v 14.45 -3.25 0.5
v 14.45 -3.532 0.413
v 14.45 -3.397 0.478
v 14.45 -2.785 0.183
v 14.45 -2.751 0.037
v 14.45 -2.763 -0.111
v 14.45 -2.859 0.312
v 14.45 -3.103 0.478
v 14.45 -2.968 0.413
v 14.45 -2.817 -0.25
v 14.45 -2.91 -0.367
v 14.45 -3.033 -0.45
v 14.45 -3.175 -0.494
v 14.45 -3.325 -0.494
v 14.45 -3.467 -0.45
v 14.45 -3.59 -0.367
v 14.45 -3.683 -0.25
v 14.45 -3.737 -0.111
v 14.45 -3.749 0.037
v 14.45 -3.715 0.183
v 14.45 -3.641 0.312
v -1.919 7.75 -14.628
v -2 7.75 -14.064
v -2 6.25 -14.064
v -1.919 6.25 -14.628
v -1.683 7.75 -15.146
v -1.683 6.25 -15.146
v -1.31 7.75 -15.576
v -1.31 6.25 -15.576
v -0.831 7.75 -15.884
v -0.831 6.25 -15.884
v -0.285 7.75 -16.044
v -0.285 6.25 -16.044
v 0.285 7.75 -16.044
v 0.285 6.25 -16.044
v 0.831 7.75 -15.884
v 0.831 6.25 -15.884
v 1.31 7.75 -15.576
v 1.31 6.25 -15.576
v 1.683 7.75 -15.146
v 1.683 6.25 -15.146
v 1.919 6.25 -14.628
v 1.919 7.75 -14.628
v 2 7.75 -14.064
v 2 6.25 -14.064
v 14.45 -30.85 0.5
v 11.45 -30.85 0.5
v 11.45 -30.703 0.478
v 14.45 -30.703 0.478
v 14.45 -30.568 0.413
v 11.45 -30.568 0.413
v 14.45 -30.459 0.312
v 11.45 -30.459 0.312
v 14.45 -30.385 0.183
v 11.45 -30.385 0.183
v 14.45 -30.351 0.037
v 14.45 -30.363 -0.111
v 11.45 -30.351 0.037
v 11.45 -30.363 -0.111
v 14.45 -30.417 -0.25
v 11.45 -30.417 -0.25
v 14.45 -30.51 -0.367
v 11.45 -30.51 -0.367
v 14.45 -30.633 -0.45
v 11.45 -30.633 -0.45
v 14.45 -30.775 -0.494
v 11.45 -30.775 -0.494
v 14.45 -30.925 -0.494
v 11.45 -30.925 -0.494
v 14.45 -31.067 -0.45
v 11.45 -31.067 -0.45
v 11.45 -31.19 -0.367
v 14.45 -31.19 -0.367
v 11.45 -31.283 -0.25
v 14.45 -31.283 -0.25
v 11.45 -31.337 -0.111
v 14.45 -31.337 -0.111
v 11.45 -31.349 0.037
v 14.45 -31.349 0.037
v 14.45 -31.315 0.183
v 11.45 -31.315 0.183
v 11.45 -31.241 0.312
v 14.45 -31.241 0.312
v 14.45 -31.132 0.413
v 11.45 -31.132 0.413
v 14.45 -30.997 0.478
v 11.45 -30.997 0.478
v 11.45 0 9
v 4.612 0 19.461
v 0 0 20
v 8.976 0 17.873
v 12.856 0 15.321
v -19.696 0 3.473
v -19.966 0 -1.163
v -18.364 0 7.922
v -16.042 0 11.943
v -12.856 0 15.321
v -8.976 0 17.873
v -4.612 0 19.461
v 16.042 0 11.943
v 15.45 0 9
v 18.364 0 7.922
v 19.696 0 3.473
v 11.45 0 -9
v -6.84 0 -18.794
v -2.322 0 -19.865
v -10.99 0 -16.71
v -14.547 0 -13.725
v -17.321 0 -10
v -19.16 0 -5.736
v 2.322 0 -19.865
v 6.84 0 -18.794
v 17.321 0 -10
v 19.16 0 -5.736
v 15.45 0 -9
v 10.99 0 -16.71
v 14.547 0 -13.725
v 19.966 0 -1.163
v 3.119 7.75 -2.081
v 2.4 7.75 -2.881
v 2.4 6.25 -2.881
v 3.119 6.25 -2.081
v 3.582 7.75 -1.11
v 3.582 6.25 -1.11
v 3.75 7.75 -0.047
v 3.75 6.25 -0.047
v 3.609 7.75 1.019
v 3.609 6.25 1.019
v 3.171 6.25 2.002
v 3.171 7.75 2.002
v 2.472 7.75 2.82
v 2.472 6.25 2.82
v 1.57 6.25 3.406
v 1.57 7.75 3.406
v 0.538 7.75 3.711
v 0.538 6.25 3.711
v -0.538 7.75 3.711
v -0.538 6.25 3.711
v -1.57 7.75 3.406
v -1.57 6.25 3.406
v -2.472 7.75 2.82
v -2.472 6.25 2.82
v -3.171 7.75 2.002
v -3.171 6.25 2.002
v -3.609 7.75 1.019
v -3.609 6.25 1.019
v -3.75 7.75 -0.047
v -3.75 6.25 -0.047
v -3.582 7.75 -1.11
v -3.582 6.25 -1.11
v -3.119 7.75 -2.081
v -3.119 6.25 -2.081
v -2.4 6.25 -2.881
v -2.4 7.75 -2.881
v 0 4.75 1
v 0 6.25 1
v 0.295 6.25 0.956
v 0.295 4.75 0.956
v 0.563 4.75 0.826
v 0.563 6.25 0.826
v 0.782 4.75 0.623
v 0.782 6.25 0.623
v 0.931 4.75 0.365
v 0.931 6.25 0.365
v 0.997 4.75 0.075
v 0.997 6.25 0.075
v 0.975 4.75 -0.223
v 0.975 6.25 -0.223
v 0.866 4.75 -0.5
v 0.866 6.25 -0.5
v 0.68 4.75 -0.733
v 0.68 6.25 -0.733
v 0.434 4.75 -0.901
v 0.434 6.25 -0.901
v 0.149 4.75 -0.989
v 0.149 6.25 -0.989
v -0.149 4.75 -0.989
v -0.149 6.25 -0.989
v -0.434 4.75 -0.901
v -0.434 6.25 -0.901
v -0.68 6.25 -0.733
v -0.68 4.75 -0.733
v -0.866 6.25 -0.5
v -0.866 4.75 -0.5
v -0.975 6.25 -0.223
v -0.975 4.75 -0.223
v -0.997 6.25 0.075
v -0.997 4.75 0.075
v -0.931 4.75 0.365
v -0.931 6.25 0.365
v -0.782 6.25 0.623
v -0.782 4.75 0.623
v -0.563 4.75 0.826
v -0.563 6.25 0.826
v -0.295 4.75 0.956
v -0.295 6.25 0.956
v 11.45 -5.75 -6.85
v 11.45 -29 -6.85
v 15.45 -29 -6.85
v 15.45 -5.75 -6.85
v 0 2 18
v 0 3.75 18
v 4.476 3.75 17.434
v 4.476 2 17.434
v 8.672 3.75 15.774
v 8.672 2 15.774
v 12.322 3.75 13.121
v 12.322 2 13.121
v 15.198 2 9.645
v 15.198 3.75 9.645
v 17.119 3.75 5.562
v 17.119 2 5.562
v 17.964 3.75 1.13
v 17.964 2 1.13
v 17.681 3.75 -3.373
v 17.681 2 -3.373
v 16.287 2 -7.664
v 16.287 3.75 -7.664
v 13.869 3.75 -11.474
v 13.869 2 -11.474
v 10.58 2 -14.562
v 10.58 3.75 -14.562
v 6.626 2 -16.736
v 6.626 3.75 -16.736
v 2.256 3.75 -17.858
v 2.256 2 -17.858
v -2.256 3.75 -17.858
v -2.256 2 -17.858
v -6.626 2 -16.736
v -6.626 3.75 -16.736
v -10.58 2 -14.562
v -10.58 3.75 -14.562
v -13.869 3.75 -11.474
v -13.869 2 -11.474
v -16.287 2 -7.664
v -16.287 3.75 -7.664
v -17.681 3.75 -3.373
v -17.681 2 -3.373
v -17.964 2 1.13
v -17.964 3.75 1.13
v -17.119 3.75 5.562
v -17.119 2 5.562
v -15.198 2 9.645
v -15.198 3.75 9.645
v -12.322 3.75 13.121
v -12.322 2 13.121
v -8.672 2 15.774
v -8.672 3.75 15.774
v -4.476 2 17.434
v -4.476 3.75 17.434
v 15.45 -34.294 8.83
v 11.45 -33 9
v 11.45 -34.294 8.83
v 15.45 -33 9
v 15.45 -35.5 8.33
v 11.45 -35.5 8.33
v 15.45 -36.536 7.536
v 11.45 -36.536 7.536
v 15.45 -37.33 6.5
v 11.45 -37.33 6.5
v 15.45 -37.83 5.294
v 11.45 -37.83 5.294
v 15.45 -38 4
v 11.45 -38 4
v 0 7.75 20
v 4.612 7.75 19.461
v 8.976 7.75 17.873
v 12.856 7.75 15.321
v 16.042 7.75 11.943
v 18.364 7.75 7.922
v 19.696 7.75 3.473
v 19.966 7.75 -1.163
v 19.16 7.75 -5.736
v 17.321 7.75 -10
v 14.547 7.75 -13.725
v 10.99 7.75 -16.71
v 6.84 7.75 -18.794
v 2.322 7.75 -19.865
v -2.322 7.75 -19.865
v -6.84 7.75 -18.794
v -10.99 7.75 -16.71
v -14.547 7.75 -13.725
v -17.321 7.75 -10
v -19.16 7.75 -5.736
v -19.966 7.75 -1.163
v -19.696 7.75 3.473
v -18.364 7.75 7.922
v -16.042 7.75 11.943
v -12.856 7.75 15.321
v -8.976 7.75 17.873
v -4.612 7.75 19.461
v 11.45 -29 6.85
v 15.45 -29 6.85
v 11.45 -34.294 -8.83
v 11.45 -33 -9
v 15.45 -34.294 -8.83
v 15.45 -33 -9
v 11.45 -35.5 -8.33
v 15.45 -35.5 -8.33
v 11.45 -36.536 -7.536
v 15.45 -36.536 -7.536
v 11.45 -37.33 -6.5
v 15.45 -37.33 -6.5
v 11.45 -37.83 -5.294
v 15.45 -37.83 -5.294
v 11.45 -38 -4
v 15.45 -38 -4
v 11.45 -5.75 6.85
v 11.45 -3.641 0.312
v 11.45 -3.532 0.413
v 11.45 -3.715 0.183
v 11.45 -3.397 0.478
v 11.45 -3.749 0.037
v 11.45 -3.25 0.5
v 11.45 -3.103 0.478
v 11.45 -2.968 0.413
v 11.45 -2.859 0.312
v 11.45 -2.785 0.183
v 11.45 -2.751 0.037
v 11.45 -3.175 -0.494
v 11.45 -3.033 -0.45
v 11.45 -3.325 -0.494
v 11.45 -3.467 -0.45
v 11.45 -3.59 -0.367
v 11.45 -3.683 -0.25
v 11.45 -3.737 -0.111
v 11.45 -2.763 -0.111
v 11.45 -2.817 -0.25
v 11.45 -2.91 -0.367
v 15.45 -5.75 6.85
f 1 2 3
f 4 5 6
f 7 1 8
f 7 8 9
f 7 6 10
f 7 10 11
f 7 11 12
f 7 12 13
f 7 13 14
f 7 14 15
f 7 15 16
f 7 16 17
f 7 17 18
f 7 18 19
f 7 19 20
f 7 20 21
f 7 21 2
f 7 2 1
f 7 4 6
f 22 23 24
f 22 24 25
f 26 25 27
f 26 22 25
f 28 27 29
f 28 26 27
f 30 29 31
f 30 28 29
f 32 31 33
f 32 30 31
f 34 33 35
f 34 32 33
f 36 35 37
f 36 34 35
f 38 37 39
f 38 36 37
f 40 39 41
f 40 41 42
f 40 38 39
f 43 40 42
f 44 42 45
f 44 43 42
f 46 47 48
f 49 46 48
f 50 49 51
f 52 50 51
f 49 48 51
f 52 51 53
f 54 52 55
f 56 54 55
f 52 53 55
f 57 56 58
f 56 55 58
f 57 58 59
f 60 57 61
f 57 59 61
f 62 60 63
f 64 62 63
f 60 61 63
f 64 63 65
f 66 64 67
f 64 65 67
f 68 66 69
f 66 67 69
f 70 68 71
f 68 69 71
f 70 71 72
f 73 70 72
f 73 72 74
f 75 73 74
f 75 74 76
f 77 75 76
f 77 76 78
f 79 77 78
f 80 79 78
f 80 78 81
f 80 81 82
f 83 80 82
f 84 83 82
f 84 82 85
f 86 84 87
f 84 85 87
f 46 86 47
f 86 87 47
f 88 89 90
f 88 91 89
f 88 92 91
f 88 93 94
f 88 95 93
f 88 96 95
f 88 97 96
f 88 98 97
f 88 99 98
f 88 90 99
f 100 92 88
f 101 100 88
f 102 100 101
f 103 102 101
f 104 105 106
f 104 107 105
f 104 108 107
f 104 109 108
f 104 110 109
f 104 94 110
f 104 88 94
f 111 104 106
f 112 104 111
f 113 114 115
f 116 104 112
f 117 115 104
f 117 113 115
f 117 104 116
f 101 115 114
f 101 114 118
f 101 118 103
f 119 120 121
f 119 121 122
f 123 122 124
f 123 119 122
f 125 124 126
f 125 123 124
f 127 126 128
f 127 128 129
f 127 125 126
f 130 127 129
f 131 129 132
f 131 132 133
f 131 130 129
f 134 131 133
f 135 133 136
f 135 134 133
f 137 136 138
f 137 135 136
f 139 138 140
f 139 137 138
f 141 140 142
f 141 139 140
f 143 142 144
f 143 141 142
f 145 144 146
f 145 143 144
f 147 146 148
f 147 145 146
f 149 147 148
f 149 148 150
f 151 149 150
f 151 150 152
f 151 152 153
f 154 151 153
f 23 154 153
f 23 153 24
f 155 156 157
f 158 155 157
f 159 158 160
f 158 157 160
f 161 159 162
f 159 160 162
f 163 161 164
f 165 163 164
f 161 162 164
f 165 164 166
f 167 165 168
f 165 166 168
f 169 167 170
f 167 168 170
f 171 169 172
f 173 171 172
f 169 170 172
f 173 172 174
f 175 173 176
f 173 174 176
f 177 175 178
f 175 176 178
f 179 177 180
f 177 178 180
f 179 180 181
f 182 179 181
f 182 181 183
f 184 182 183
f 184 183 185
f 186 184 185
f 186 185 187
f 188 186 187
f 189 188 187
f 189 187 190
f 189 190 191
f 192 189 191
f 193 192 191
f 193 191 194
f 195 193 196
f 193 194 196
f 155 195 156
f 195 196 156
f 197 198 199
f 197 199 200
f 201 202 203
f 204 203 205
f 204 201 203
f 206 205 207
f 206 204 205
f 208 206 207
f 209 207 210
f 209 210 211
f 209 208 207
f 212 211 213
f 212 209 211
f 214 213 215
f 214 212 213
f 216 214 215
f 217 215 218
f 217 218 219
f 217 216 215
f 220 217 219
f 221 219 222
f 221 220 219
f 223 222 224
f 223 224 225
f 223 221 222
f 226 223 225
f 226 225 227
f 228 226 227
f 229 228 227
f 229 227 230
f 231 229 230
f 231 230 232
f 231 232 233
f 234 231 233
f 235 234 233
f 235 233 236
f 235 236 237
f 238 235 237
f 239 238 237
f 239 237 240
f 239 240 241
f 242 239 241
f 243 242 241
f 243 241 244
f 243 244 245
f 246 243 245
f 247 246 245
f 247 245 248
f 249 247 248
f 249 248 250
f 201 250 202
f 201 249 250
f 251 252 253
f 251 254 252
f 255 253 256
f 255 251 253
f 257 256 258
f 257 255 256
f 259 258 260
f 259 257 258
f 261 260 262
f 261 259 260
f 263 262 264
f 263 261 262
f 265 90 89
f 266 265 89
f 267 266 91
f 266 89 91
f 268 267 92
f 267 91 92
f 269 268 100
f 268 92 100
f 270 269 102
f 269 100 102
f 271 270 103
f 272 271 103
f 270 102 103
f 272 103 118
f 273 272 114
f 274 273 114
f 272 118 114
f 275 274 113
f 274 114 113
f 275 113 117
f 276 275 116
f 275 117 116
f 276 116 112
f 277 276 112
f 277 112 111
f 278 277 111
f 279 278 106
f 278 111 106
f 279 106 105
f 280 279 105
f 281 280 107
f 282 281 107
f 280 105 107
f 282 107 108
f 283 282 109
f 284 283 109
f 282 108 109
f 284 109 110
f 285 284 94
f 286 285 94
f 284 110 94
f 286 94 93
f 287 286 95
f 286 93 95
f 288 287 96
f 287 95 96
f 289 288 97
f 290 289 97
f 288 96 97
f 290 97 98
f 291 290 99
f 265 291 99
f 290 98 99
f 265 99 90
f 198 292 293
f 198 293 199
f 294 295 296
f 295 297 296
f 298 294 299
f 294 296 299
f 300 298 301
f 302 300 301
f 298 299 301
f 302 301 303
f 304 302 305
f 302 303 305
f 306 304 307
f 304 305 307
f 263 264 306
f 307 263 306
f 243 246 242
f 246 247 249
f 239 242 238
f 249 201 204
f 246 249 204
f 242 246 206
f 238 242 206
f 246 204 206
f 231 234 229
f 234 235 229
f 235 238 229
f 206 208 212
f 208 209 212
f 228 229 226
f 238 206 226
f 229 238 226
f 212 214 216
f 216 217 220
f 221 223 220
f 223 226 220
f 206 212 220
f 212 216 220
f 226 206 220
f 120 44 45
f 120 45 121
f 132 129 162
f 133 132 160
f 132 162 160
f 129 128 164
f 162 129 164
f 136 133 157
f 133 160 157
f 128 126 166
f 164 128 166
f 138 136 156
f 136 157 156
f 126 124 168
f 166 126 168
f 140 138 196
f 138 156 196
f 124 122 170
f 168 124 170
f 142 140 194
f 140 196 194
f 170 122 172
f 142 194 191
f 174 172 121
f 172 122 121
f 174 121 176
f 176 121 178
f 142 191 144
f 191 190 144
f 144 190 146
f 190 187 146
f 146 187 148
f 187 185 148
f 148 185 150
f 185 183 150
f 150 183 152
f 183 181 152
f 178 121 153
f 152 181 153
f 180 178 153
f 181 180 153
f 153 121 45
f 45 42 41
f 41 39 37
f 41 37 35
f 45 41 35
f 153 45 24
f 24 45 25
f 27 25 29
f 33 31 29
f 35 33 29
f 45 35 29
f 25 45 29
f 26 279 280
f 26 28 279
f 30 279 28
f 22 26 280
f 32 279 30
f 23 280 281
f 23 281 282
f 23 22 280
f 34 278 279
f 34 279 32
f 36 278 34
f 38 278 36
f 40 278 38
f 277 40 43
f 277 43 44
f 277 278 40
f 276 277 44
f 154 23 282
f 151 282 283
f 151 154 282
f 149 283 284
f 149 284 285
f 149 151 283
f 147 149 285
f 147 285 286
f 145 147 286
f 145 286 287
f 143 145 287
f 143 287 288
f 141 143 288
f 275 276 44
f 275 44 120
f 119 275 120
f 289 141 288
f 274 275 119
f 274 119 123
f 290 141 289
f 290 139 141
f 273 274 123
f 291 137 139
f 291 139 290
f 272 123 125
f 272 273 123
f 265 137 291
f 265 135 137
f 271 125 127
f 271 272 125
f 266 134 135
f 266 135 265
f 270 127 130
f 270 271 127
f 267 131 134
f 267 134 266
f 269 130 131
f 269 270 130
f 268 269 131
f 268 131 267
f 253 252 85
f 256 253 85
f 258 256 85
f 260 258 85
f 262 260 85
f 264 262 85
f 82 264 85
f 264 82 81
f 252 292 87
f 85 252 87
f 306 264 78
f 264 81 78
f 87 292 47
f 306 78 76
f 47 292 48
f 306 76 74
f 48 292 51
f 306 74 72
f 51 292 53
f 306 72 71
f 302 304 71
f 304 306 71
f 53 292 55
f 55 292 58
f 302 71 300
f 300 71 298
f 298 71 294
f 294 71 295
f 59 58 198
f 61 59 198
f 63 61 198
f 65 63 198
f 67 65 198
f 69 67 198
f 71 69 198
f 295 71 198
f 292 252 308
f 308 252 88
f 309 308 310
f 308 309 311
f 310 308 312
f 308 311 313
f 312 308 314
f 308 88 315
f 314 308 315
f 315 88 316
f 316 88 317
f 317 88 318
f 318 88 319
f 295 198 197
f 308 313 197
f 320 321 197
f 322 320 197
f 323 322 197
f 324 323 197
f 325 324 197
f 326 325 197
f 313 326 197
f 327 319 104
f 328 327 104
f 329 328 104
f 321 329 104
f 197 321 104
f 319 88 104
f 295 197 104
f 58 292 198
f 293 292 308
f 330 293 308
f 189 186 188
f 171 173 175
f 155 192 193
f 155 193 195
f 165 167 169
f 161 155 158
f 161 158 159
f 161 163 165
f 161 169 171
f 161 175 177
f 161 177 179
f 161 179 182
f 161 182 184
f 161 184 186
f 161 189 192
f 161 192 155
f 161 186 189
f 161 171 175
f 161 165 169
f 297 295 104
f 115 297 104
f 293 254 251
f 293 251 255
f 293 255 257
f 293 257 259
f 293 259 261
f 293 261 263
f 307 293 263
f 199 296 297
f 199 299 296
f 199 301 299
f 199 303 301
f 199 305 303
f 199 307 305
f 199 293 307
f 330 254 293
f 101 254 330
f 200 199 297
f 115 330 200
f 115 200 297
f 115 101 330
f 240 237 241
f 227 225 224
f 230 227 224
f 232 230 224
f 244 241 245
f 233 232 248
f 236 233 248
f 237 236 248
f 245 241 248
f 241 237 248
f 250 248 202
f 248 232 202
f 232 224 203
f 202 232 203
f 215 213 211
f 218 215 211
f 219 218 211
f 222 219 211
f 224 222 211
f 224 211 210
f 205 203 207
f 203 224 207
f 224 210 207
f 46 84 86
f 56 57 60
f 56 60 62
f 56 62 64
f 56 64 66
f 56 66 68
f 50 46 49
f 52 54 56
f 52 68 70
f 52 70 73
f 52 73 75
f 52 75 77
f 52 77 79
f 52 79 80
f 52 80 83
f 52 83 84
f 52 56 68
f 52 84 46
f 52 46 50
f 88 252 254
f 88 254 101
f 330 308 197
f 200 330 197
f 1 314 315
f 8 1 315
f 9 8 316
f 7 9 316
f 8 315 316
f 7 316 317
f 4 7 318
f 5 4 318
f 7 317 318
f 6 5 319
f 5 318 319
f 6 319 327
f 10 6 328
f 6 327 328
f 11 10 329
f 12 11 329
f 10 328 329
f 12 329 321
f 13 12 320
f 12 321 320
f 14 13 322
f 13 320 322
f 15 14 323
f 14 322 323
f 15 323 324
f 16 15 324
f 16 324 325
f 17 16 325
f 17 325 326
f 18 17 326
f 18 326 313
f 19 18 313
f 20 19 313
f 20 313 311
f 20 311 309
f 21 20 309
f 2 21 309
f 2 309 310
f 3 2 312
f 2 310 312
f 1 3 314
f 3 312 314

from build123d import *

# Parameters (mm, degrees)
SKETCH1_R           = 20
SKETCH1_R_2         = 18
BOSS_EXTRUDE1_DEPTH = 7.75
BOSS_EXTRUDE2_START = -4
SKETCH2_R           = 18
BOSS_EXTRUDE2_DEPTH = 4
CUT_EXTRUDE1_DEPTH  = 1.5
SKETCH4_R           = 1
CUT_EXTRUDE2_DEPTH  = 1.5
SKETCH5_W           = 18
SKETCH5_H           = 38
SKETCH5_W_2         = 13.7
SKETCH5_H_2         = 23.25
BOSS_EXTRUDE3_DEPTH = 4
SKETCH6_R           = 18
BOSS_EXTRUDE4_DEPTH = 2
SKETCH7_R           = 0.5
CUT_EXTRUDE3_DEPTH  = 3
FILLET1_R           = 5


with BuildPart() as part:
    # Sketch1 → Boss-Extrude1 (new body)
    with BuildSketch(Plane(origin=(0, 0, 0), x_dir=(1, 0, 0), z_dir=(0, 1, 0))):
        with Locations(Location((0, 0, 0), (0, 0, 270))):
            Circle(SKETCH1_R)
        with Locations(Location((0, 0, 0), (0, 0, 270))):
            Circle(SKETCH1_R_2, mode=Mode.SUBTRACT)
    extrude(amount=BOSS_EXTRUDE1_DEPTH)

    # Sketch2 → Boss-Extrude2 (add)
    with BuildSketch(Plane(origin=(0, 7.75, 0), x_dir=(1, 0, 0), z_dir=(0, 1, 0)).offset(BOSS_EXTRUDE2_START)):
        with Locations(Location((0, 0, 0), (0, 0, 270))):
            Circle(SKETCH2_R)
    extrude(amount=BOSS_EXTRUDE2_DEPTH)

    # Sketch3 → Cut-Extrude1 (cut)
    with BuildSketch(Plane(origin=(0, 7.75, 0), x_dir=(1, 0, 0), z_dir=(0, 1, 0))):
        with BuildLine():
            Line((-2.4, 2.881405907), (-2, 14.064254381))
            ThreePointArc((-2, 14.064254381), (0, 16.064254381), (2, 14.064254381))
            Line((2, 14.064254381), (2.4, 2.881405907))
            ThreePointArc((2.4, 2.881405907), (0, -3.75), (-2.4, 2.881405907))
        make_face()
    extrude(amount=-CUT_EXTRUDE1_DEPTH, mode=Mode.SUBTRACT)

    # Sketch4 → Cut-Extrude2 (cut)
    with BuildSketch(Plane(origin=(0, 6.25, 0), x_dir=(1, 0, 0), z_dir=(0, 1, 0))):
        with Locations(Location((0, 0, 0), (0, 0, 270))):
            Circle(SKETCH4_R)
    extrude(amount=-CUT_EXTRUDE2_DEPTH, mode=Mode.SUBTRACT)



with BuildPart() as body_2:
    # Sketch5 → Boss-Extrude3 (new body)
    with BuildSketch(Plane(origin=(11.45, 0, 0), x_dir=(0, 0, -1), z_dir=(1, 0, 0))):
        with Locations((0, -19)):
            Rectangle(SKETCH5_W, SKETCH5_H)
        with Locations((0, -17.375)):
            Rectangle(SKETCH5_W_2, SKETCH5_H_2, mode=Mode.SUBTRACT)
    extrude(amount=BOSS_EXTRUDE3_DEPTH)


with BuildPart() as part_1:
    add(part.part)

    add(body_2.part)  # Boss-Extrude4 merges body 2
    # Sketch6 → Boss-Extrude4 (add)
    with BuildSketch(Plane.XZ):
        with Locations(Location((0, 0, 0), (0, 0, 270))):
            Circle(SKETCH6_R)
    extrude(amount=-BOSS_EXTRUDE4_DEPTH)

    # Sketch7 → Cut-Extrude3 (cut)
    with BuildSketch(Plane.ZY.offset(-11.45)):
        with Locations((0, -30.85)):
            Circle(SKETCH7_R)
        with Locations((0, -3.25)):
            Circle(SKETCH7_R)
    extrude(amount=-CUT_EXTRUDE3_DEPTH, mode=Mode.SUBTRACT)

    # Fillet1
    fillet1_edges = [part_1.edges().sort_by_distance(p)[0] for p in [
        (13.45, -38, 9),
        (13.45, -38, -9),
    ]]
    fillet(fillet1_edges, radius=FILLET1_R)


solid = part_1.part
